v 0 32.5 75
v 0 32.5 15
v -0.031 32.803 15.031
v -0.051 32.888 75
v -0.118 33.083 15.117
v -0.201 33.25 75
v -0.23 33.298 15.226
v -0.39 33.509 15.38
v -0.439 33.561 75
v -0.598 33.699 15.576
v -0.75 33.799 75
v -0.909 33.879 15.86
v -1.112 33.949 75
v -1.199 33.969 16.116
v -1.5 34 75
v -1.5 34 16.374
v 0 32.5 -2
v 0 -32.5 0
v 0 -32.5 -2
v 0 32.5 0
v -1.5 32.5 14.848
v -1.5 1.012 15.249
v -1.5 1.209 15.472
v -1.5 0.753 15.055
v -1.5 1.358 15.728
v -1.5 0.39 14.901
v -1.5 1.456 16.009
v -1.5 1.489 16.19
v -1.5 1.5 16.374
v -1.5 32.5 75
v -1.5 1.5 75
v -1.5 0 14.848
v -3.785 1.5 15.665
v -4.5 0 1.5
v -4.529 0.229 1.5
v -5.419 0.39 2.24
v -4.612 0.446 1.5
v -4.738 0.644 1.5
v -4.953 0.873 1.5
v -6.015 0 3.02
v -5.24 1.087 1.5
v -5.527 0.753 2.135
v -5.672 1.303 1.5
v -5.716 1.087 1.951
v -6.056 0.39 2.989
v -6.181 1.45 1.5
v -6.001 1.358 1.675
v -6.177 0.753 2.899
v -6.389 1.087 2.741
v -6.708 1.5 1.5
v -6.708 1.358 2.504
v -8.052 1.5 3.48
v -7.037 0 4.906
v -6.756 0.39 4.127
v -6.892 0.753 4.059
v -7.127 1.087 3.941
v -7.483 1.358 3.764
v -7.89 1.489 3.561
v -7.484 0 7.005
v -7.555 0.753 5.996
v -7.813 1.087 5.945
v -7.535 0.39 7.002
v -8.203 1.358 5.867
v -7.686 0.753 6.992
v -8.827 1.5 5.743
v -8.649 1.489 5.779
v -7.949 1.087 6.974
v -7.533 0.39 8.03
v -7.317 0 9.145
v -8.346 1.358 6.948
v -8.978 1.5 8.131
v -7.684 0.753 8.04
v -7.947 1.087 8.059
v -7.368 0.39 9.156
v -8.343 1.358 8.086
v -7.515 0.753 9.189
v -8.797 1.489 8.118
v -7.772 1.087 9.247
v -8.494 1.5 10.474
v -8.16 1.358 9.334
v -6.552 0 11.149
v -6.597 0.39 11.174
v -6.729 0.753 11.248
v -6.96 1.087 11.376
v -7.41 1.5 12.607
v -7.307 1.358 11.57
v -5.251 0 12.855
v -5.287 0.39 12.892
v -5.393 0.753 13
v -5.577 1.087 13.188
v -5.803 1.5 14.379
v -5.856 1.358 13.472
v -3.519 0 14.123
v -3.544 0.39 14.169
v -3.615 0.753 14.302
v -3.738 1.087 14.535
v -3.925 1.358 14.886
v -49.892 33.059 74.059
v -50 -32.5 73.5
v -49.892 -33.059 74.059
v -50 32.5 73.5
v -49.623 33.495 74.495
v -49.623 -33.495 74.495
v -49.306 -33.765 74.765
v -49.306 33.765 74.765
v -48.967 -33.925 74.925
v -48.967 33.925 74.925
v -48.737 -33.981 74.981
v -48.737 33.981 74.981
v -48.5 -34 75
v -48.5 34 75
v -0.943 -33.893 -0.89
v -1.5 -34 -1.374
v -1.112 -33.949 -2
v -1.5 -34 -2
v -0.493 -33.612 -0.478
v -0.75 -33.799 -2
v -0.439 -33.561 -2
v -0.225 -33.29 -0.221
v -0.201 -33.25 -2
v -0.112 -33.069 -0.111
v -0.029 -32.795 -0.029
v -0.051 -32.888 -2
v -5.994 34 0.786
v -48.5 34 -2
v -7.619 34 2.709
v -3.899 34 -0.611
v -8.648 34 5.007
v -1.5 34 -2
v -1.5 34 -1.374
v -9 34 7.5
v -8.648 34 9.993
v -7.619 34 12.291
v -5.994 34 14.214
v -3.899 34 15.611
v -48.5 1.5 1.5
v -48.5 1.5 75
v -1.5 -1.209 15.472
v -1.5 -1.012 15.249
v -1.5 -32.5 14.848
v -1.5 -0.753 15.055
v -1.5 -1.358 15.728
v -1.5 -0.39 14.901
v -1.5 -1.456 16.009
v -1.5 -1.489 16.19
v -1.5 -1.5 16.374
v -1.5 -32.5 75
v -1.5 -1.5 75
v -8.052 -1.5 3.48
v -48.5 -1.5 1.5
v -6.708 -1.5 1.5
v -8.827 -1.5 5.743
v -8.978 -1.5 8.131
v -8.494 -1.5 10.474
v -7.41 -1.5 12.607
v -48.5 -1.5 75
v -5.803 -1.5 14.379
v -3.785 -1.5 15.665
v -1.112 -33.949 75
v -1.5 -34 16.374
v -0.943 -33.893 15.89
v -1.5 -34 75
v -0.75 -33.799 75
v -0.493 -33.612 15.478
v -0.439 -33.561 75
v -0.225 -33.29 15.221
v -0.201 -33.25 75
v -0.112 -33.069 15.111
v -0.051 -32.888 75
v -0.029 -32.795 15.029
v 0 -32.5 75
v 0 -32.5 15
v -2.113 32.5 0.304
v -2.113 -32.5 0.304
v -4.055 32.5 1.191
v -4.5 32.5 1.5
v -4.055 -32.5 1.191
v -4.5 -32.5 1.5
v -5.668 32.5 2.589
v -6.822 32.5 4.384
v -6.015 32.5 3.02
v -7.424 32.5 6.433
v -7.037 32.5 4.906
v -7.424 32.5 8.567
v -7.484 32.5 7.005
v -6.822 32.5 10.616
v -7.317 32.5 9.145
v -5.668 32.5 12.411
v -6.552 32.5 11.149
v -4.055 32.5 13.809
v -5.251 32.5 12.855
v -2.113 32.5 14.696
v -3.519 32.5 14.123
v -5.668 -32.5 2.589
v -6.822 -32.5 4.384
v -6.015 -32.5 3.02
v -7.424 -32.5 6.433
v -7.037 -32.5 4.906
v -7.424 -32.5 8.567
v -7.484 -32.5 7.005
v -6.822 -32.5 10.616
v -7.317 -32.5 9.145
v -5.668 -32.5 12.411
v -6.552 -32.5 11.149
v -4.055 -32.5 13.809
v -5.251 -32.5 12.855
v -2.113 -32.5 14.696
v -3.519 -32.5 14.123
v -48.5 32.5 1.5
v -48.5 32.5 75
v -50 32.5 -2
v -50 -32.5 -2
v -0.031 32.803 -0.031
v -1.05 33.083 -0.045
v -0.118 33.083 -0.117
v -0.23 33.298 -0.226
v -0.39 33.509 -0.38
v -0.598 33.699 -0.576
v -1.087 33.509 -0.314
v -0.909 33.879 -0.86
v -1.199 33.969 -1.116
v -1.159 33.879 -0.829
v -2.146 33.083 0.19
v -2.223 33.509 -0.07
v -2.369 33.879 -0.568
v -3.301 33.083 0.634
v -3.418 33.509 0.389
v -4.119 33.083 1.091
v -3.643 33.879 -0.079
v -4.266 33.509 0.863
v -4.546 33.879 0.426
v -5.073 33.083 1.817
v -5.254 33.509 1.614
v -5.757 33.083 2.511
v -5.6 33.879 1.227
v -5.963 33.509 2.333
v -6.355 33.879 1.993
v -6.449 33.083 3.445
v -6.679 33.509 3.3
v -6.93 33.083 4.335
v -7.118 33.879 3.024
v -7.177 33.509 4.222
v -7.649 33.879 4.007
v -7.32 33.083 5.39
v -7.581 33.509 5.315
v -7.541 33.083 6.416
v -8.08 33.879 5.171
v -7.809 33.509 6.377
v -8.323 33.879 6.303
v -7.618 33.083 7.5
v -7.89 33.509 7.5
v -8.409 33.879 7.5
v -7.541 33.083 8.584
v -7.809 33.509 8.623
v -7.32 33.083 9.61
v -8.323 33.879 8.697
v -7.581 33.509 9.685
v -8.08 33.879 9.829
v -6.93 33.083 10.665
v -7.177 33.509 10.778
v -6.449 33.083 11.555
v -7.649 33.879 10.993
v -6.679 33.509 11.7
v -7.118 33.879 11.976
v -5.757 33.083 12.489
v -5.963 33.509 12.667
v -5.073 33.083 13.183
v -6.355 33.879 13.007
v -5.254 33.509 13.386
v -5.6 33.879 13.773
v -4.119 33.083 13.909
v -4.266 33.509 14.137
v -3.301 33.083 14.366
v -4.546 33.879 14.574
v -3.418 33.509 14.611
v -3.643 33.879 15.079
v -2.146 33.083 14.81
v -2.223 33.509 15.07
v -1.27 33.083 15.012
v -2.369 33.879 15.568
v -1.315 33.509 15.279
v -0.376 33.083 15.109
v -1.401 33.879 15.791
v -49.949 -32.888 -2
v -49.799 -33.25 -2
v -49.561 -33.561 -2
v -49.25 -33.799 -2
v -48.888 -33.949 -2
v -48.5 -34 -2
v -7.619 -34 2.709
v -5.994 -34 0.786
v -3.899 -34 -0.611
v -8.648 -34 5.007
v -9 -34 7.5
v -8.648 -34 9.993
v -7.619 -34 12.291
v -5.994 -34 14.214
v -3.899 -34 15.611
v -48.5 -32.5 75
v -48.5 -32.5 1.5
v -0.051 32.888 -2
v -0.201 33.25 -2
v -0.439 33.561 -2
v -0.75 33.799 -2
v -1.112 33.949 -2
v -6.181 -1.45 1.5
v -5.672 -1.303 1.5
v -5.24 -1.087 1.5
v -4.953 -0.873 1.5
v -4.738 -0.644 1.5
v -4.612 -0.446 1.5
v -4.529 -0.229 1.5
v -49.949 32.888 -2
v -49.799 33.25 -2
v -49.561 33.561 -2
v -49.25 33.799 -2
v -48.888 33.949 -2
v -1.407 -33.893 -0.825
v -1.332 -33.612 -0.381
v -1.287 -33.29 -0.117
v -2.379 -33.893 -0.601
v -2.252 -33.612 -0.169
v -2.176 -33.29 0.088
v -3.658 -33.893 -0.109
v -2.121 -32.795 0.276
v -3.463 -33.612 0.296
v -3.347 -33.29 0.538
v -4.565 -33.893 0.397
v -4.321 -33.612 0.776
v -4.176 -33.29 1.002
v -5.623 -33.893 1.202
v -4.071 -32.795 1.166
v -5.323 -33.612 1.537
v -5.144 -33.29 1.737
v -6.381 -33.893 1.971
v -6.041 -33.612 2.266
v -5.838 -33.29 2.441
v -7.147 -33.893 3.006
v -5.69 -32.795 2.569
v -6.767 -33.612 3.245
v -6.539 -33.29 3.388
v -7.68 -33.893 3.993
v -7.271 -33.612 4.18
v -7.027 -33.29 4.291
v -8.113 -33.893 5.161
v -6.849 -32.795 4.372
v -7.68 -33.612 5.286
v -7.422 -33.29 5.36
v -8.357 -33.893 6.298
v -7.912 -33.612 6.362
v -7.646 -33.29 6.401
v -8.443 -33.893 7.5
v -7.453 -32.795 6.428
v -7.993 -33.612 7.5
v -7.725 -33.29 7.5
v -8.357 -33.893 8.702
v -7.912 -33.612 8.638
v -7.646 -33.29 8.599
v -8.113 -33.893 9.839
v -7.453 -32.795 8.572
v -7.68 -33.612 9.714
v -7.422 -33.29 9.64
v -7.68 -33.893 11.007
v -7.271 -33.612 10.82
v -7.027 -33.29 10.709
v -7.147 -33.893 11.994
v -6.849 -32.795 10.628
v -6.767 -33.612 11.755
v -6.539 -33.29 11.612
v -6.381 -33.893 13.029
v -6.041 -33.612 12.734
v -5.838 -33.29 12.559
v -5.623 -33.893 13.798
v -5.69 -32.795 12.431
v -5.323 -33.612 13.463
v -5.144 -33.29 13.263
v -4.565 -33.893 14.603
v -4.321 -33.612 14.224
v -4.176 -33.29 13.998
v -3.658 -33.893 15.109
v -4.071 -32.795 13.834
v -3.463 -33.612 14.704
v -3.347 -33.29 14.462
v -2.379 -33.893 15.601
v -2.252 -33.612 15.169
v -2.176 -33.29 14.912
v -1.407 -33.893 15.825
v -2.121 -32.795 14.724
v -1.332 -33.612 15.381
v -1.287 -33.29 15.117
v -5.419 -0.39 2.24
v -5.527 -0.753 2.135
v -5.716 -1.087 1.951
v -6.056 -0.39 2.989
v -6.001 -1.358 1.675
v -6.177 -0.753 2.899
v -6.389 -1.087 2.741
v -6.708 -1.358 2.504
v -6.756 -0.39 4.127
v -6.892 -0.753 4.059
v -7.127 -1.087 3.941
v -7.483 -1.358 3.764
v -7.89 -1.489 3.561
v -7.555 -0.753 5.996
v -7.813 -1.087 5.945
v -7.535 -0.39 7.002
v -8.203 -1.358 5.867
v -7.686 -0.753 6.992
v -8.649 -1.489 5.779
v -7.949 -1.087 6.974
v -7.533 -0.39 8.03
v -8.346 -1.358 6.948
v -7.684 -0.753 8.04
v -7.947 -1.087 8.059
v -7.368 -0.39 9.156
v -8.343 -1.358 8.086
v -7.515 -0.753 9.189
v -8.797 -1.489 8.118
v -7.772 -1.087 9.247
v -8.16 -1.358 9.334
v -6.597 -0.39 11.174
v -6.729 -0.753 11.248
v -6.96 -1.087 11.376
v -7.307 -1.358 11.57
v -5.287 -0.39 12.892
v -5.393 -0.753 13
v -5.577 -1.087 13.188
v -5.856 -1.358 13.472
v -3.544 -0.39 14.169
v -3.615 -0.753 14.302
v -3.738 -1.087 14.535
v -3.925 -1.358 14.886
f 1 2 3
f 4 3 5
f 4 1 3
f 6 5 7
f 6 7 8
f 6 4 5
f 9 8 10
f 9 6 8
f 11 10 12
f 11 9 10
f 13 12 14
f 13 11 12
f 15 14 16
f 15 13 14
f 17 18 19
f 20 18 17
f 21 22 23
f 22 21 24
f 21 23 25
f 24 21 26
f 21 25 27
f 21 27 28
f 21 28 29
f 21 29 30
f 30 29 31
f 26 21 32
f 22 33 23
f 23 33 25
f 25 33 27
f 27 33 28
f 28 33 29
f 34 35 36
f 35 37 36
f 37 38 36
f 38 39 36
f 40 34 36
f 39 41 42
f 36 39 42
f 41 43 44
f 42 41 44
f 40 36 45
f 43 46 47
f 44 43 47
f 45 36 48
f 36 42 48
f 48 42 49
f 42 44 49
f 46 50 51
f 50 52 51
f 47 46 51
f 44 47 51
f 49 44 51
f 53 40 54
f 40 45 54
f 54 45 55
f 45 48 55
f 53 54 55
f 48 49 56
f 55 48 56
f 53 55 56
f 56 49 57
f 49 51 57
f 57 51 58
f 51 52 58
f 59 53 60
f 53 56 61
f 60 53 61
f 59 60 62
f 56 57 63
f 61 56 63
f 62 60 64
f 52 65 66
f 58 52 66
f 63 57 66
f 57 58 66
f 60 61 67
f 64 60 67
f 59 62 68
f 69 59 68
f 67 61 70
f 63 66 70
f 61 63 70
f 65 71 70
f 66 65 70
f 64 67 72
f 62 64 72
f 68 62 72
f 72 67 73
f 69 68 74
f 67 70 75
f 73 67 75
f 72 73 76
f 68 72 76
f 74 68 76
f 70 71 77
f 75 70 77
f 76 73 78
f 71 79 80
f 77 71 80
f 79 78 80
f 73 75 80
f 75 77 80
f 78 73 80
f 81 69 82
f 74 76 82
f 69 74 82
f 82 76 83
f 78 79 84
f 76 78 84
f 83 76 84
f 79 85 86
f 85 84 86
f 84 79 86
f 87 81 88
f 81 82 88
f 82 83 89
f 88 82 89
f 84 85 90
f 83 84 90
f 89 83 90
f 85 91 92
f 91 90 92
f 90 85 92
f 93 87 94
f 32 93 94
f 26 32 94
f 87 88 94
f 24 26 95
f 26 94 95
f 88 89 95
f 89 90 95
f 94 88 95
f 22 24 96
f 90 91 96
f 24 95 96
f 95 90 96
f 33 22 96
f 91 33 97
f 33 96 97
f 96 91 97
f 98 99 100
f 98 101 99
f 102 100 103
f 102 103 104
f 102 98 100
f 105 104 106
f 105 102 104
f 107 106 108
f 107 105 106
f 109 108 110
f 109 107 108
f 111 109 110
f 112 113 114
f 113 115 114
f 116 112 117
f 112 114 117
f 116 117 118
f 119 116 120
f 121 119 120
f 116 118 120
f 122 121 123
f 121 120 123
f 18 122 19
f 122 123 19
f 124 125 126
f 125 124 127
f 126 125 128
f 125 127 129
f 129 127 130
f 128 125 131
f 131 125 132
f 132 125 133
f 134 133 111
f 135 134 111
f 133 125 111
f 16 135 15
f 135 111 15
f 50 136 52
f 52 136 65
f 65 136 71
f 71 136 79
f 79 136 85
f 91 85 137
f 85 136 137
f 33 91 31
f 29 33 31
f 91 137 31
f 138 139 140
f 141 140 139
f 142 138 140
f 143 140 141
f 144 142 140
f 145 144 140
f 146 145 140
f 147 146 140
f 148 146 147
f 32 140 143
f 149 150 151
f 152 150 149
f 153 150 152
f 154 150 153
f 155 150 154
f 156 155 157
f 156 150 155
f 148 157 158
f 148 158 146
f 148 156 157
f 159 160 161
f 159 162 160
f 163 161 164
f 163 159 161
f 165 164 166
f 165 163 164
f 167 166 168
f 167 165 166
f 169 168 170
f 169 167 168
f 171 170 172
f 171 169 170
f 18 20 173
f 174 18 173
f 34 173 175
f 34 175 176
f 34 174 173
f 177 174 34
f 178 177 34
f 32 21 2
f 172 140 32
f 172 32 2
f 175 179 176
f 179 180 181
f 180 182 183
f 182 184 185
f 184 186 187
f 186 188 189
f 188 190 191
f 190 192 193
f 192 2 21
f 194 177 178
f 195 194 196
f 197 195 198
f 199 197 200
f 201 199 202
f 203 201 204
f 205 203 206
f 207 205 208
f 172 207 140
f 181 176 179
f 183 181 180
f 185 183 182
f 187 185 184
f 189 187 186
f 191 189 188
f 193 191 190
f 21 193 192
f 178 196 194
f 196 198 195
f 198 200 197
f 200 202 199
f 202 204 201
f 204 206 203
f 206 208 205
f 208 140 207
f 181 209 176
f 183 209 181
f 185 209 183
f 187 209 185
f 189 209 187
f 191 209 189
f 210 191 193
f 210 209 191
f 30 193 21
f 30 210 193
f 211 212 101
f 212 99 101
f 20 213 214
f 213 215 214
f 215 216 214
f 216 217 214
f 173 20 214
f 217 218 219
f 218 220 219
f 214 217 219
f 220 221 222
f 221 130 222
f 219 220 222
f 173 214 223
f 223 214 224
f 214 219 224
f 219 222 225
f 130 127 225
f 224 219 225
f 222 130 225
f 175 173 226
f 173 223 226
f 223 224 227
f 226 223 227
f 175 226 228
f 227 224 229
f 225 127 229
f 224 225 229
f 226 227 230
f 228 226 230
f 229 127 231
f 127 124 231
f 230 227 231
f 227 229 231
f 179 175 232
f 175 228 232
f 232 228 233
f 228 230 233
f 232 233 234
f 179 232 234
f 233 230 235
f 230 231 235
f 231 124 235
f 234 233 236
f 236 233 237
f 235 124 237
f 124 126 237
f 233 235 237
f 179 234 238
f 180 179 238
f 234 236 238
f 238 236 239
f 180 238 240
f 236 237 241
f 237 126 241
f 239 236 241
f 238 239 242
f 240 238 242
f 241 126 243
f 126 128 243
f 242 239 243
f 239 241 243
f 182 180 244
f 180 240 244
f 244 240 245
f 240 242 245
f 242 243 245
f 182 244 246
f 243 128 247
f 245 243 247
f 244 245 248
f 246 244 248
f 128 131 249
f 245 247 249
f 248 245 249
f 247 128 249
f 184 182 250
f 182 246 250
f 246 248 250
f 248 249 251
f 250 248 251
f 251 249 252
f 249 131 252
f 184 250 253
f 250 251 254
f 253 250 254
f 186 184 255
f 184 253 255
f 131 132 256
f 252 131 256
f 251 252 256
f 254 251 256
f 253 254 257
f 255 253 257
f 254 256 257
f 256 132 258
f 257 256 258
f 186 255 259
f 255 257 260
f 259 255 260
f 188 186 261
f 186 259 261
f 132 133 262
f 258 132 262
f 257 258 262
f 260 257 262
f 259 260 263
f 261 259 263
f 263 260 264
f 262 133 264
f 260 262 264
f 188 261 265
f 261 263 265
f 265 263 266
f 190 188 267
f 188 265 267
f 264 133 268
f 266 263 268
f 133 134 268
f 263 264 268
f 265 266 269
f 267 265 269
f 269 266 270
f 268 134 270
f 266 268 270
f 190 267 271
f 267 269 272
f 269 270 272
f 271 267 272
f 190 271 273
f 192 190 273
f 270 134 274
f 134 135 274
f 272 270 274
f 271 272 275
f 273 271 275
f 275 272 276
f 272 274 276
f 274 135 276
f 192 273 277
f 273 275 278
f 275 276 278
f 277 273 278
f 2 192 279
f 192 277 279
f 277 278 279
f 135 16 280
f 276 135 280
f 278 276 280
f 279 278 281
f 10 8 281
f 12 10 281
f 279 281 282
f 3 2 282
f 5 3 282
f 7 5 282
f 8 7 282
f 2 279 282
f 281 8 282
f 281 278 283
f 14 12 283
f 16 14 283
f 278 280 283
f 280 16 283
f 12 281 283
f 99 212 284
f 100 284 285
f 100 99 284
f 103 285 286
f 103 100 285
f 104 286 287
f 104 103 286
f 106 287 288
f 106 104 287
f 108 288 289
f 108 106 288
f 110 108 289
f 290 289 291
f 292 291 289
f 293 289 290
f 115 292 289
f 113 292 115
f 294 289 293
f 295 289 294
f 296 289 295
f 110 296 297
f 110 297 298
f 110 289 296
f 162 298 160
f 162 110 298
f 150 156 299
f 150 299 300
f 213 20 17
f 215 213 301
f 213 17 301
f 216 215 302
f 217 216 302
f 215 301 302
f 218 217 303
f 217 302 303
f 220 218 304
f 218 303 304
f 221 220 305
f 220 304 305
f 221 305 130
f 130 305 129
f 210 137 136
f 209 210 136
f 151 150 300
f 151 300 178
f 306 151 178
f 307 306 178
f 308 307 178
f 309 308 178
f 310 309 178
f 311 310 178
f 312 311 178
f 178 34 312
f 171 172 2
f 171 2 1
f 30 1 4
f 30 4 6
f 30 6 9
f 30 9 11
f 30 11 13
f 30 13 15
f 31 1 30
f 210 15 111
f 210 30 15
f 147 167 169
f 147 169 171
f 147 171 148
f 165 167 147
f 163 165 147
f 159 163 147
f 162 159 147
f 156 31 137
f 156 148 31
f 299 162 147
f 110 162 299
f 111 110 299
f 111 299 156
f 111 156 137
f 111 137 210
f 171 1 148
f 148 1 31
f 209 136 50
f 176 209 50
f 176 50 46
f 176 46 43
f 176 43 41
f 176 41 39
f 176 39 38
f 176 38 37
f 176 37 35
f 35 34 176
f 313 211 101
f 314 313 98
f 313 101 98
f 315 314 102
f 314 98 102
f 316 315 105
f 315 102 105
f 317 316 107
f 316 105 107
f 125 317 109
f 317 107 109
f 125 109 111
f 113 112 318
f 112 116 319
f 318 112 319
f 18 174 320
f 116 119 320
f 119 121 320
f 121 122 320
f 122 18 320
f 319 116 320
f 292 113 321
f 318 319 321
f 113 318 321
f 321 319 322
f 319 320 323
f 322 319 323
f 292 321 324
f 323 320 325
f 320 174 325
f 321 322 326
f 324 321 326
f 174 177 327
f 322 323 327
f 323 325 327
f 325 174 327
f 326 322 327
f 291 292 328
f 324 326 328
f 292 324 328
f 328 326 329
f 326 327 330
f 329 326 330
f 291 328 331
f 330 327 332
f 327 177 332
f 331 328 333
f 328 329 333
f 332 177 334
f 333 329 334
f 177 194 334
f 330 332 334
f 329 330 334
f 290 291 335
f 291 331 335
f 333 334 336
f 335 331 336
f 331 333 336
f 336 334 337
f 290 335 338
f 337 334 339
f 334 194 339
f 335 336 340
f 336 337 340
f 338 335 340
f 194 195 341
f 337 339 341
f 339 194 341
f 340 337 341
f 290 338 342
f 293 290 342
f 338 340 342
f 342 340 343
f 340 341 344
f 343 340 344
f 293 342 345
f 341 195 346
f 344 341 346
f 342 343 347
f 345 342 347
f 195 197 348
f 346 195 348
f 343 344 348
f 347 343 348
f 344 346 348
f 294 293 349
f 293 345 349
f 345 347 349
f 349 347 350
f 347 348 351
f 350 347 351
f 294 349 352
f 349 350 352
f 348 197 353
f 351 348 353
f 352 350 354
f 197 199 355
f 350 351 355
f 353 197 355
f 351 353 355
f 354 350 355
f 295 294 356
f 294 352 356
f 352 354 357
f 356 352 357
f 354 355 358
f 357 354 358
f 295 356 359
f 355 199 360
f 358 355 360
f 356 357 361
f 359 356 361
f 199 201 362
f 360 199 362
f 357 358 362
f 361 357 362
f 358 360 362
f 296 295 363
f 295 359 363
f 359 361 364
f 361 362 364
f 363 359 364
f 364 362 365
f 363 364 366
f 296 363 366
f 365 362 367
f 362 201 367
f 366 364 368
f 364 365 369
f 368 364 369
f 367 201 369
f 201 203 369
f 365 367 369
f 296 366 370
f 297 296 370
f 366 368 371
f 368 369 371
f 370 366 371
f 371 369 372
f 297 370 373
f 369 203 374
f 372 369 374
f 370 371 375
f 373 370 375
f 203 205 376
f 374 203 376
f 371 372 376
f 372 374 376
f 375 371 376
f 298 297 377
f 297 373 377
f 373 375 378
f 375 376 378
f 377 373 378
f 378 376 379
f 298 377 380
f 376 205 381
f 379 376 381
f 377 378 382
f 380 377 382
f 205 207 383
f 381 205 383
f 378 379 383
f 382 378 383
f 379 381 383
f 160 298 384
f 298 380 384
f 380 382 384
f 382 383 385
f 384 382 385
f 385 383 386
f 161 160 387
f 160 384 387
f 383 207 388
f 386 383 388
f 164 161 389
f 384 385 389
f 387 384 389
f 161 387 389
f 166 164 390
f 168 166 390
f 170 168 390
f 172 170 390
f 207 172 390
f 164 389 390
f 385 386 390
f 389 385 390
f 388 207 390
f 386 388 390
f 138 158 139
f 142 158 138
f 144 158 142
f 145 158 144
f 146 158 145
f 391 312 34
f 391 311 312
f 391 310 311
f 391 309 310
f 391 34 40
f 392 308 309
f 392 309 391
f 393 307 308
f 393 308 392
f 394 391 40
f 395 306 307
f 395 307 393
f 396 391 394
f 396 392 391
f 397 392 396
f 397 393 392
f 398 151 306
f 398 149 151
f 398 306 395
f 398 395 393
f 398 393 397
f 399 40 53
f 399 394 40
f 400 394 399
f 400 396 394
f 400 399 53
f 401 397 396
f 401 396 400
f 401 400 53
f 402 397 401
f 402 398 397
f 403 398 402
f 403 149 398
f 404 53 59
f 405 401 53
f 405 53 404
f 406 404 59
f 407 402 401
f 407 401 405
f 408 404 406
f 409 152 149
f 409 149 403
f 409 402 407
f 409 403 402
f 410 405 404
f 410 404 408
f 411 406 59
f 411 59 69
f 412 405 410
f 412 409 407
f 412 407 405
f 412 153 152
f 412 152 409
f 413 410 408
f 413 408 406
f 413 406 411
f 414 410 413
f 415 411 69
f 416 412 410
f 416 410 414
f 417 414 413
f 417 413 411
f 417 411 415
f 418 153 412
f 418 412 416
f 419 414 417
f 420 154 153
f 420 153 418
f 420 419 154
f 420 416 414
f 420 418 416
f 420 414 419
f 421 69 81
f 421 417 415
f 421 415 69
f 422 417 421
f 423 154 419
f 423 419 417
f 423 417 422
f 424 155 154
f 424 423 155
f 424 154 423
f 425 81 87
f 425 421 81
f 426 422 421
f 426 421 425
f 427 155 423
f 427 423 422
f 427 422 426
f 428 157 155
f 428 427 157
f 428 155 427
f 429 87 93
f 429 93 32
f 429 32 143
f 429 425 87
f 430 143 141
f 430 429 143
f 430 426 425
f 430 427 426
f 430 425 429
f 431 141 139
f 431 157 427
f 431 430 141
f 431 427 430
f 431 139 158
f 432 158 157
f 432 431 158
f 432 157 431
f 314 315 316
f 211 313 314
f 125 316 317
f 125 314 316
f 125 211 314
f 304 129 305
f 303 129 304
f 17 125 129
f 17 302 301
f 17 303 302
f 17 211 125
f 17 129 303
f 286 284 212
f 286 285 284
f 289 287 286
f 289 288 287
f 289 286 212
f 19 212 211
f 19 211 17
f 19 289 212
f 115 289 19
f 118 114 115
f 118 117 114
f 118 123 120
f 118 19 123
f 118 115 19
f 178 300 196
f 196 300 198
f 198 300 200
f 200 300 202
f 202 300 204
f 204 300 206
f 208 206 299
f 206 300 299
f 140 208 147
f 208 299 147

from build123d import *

# Parameters (mm, degrees)
F1_DEPTH = 34
F2_T     = -1.5
F3_DEPTH = 2
F6_R     = 1.49999


# Not quite as in the source:
# - a fillet or chamfer is up to 0.001 mm smaller than in the source, because OpenCascade refuses the exact size


with BuildPart() as f1:
    # F0 (on Front) → F1 (new body)
    with BuildSketch(Plane.XZ):
        with BuildLine():
            Line((0, 75), (-50, 75))
            Line((-50, 75), (-50, 0))
            Line((-50, 0), (0, 0))
            ThreePointArc((0, 0), (-7.5, 7.5), (0, 15))
            Line((0, 15), (0, 75))
        make_face()
    extrude(amount=F1_DEPTH)

    # F2
    f2_openings = [f1.faces().sort_by_distance(p)[0] for p in [
        (-25, -17, 75),
        (-7.5, -17, 7.5),
    ]]
    offset(amount=F2_T, openings=f2_openings)

    # F3 (add): a face of the model
    f3_faces = [f1.faces().sort_by_distance(p)[0] for p in [
        (-25, -17, 0),
    ]]
    extrude(f3_faces, amount=F3_DEPTH)


with BuildPart() as f4_1:
    # F4: instance of F1
    add(f1.part.mirror(Plane(origin=(-25.5124575843, 0, 37.1811815231), x_dir=(-1, 0, 0), z_dir=(0, 1, 0))))


with BuildPart() as f1_1:
    add(f1.part)

    # F5: union F4_1
    add(f4_1.part)

    # F6 (radius 1.5 in the source; OpenCascade refuses exactly that, so slightly less here)
    f6_edges = [f1_1.edges().sort_by_distance(p)[0] for p in [
        (0, -34, 45),
        (-50, -34, 36.5),
        (-50, 34, 36.5),
        (0, 34, -1),
        (0, -34, -1),
        (-50, 0, 75),
        (0, 34, 45),
        (-7.5, 34, 7.5),
        (-7.317473, 1.5, 9.144564),
        (-7.317473, -1.5, 9.144564),
        (-7.5, -34, 7.5),
    ]]
    fillet(f6_edges, radius=F6_R)


solid = f1_1.part
